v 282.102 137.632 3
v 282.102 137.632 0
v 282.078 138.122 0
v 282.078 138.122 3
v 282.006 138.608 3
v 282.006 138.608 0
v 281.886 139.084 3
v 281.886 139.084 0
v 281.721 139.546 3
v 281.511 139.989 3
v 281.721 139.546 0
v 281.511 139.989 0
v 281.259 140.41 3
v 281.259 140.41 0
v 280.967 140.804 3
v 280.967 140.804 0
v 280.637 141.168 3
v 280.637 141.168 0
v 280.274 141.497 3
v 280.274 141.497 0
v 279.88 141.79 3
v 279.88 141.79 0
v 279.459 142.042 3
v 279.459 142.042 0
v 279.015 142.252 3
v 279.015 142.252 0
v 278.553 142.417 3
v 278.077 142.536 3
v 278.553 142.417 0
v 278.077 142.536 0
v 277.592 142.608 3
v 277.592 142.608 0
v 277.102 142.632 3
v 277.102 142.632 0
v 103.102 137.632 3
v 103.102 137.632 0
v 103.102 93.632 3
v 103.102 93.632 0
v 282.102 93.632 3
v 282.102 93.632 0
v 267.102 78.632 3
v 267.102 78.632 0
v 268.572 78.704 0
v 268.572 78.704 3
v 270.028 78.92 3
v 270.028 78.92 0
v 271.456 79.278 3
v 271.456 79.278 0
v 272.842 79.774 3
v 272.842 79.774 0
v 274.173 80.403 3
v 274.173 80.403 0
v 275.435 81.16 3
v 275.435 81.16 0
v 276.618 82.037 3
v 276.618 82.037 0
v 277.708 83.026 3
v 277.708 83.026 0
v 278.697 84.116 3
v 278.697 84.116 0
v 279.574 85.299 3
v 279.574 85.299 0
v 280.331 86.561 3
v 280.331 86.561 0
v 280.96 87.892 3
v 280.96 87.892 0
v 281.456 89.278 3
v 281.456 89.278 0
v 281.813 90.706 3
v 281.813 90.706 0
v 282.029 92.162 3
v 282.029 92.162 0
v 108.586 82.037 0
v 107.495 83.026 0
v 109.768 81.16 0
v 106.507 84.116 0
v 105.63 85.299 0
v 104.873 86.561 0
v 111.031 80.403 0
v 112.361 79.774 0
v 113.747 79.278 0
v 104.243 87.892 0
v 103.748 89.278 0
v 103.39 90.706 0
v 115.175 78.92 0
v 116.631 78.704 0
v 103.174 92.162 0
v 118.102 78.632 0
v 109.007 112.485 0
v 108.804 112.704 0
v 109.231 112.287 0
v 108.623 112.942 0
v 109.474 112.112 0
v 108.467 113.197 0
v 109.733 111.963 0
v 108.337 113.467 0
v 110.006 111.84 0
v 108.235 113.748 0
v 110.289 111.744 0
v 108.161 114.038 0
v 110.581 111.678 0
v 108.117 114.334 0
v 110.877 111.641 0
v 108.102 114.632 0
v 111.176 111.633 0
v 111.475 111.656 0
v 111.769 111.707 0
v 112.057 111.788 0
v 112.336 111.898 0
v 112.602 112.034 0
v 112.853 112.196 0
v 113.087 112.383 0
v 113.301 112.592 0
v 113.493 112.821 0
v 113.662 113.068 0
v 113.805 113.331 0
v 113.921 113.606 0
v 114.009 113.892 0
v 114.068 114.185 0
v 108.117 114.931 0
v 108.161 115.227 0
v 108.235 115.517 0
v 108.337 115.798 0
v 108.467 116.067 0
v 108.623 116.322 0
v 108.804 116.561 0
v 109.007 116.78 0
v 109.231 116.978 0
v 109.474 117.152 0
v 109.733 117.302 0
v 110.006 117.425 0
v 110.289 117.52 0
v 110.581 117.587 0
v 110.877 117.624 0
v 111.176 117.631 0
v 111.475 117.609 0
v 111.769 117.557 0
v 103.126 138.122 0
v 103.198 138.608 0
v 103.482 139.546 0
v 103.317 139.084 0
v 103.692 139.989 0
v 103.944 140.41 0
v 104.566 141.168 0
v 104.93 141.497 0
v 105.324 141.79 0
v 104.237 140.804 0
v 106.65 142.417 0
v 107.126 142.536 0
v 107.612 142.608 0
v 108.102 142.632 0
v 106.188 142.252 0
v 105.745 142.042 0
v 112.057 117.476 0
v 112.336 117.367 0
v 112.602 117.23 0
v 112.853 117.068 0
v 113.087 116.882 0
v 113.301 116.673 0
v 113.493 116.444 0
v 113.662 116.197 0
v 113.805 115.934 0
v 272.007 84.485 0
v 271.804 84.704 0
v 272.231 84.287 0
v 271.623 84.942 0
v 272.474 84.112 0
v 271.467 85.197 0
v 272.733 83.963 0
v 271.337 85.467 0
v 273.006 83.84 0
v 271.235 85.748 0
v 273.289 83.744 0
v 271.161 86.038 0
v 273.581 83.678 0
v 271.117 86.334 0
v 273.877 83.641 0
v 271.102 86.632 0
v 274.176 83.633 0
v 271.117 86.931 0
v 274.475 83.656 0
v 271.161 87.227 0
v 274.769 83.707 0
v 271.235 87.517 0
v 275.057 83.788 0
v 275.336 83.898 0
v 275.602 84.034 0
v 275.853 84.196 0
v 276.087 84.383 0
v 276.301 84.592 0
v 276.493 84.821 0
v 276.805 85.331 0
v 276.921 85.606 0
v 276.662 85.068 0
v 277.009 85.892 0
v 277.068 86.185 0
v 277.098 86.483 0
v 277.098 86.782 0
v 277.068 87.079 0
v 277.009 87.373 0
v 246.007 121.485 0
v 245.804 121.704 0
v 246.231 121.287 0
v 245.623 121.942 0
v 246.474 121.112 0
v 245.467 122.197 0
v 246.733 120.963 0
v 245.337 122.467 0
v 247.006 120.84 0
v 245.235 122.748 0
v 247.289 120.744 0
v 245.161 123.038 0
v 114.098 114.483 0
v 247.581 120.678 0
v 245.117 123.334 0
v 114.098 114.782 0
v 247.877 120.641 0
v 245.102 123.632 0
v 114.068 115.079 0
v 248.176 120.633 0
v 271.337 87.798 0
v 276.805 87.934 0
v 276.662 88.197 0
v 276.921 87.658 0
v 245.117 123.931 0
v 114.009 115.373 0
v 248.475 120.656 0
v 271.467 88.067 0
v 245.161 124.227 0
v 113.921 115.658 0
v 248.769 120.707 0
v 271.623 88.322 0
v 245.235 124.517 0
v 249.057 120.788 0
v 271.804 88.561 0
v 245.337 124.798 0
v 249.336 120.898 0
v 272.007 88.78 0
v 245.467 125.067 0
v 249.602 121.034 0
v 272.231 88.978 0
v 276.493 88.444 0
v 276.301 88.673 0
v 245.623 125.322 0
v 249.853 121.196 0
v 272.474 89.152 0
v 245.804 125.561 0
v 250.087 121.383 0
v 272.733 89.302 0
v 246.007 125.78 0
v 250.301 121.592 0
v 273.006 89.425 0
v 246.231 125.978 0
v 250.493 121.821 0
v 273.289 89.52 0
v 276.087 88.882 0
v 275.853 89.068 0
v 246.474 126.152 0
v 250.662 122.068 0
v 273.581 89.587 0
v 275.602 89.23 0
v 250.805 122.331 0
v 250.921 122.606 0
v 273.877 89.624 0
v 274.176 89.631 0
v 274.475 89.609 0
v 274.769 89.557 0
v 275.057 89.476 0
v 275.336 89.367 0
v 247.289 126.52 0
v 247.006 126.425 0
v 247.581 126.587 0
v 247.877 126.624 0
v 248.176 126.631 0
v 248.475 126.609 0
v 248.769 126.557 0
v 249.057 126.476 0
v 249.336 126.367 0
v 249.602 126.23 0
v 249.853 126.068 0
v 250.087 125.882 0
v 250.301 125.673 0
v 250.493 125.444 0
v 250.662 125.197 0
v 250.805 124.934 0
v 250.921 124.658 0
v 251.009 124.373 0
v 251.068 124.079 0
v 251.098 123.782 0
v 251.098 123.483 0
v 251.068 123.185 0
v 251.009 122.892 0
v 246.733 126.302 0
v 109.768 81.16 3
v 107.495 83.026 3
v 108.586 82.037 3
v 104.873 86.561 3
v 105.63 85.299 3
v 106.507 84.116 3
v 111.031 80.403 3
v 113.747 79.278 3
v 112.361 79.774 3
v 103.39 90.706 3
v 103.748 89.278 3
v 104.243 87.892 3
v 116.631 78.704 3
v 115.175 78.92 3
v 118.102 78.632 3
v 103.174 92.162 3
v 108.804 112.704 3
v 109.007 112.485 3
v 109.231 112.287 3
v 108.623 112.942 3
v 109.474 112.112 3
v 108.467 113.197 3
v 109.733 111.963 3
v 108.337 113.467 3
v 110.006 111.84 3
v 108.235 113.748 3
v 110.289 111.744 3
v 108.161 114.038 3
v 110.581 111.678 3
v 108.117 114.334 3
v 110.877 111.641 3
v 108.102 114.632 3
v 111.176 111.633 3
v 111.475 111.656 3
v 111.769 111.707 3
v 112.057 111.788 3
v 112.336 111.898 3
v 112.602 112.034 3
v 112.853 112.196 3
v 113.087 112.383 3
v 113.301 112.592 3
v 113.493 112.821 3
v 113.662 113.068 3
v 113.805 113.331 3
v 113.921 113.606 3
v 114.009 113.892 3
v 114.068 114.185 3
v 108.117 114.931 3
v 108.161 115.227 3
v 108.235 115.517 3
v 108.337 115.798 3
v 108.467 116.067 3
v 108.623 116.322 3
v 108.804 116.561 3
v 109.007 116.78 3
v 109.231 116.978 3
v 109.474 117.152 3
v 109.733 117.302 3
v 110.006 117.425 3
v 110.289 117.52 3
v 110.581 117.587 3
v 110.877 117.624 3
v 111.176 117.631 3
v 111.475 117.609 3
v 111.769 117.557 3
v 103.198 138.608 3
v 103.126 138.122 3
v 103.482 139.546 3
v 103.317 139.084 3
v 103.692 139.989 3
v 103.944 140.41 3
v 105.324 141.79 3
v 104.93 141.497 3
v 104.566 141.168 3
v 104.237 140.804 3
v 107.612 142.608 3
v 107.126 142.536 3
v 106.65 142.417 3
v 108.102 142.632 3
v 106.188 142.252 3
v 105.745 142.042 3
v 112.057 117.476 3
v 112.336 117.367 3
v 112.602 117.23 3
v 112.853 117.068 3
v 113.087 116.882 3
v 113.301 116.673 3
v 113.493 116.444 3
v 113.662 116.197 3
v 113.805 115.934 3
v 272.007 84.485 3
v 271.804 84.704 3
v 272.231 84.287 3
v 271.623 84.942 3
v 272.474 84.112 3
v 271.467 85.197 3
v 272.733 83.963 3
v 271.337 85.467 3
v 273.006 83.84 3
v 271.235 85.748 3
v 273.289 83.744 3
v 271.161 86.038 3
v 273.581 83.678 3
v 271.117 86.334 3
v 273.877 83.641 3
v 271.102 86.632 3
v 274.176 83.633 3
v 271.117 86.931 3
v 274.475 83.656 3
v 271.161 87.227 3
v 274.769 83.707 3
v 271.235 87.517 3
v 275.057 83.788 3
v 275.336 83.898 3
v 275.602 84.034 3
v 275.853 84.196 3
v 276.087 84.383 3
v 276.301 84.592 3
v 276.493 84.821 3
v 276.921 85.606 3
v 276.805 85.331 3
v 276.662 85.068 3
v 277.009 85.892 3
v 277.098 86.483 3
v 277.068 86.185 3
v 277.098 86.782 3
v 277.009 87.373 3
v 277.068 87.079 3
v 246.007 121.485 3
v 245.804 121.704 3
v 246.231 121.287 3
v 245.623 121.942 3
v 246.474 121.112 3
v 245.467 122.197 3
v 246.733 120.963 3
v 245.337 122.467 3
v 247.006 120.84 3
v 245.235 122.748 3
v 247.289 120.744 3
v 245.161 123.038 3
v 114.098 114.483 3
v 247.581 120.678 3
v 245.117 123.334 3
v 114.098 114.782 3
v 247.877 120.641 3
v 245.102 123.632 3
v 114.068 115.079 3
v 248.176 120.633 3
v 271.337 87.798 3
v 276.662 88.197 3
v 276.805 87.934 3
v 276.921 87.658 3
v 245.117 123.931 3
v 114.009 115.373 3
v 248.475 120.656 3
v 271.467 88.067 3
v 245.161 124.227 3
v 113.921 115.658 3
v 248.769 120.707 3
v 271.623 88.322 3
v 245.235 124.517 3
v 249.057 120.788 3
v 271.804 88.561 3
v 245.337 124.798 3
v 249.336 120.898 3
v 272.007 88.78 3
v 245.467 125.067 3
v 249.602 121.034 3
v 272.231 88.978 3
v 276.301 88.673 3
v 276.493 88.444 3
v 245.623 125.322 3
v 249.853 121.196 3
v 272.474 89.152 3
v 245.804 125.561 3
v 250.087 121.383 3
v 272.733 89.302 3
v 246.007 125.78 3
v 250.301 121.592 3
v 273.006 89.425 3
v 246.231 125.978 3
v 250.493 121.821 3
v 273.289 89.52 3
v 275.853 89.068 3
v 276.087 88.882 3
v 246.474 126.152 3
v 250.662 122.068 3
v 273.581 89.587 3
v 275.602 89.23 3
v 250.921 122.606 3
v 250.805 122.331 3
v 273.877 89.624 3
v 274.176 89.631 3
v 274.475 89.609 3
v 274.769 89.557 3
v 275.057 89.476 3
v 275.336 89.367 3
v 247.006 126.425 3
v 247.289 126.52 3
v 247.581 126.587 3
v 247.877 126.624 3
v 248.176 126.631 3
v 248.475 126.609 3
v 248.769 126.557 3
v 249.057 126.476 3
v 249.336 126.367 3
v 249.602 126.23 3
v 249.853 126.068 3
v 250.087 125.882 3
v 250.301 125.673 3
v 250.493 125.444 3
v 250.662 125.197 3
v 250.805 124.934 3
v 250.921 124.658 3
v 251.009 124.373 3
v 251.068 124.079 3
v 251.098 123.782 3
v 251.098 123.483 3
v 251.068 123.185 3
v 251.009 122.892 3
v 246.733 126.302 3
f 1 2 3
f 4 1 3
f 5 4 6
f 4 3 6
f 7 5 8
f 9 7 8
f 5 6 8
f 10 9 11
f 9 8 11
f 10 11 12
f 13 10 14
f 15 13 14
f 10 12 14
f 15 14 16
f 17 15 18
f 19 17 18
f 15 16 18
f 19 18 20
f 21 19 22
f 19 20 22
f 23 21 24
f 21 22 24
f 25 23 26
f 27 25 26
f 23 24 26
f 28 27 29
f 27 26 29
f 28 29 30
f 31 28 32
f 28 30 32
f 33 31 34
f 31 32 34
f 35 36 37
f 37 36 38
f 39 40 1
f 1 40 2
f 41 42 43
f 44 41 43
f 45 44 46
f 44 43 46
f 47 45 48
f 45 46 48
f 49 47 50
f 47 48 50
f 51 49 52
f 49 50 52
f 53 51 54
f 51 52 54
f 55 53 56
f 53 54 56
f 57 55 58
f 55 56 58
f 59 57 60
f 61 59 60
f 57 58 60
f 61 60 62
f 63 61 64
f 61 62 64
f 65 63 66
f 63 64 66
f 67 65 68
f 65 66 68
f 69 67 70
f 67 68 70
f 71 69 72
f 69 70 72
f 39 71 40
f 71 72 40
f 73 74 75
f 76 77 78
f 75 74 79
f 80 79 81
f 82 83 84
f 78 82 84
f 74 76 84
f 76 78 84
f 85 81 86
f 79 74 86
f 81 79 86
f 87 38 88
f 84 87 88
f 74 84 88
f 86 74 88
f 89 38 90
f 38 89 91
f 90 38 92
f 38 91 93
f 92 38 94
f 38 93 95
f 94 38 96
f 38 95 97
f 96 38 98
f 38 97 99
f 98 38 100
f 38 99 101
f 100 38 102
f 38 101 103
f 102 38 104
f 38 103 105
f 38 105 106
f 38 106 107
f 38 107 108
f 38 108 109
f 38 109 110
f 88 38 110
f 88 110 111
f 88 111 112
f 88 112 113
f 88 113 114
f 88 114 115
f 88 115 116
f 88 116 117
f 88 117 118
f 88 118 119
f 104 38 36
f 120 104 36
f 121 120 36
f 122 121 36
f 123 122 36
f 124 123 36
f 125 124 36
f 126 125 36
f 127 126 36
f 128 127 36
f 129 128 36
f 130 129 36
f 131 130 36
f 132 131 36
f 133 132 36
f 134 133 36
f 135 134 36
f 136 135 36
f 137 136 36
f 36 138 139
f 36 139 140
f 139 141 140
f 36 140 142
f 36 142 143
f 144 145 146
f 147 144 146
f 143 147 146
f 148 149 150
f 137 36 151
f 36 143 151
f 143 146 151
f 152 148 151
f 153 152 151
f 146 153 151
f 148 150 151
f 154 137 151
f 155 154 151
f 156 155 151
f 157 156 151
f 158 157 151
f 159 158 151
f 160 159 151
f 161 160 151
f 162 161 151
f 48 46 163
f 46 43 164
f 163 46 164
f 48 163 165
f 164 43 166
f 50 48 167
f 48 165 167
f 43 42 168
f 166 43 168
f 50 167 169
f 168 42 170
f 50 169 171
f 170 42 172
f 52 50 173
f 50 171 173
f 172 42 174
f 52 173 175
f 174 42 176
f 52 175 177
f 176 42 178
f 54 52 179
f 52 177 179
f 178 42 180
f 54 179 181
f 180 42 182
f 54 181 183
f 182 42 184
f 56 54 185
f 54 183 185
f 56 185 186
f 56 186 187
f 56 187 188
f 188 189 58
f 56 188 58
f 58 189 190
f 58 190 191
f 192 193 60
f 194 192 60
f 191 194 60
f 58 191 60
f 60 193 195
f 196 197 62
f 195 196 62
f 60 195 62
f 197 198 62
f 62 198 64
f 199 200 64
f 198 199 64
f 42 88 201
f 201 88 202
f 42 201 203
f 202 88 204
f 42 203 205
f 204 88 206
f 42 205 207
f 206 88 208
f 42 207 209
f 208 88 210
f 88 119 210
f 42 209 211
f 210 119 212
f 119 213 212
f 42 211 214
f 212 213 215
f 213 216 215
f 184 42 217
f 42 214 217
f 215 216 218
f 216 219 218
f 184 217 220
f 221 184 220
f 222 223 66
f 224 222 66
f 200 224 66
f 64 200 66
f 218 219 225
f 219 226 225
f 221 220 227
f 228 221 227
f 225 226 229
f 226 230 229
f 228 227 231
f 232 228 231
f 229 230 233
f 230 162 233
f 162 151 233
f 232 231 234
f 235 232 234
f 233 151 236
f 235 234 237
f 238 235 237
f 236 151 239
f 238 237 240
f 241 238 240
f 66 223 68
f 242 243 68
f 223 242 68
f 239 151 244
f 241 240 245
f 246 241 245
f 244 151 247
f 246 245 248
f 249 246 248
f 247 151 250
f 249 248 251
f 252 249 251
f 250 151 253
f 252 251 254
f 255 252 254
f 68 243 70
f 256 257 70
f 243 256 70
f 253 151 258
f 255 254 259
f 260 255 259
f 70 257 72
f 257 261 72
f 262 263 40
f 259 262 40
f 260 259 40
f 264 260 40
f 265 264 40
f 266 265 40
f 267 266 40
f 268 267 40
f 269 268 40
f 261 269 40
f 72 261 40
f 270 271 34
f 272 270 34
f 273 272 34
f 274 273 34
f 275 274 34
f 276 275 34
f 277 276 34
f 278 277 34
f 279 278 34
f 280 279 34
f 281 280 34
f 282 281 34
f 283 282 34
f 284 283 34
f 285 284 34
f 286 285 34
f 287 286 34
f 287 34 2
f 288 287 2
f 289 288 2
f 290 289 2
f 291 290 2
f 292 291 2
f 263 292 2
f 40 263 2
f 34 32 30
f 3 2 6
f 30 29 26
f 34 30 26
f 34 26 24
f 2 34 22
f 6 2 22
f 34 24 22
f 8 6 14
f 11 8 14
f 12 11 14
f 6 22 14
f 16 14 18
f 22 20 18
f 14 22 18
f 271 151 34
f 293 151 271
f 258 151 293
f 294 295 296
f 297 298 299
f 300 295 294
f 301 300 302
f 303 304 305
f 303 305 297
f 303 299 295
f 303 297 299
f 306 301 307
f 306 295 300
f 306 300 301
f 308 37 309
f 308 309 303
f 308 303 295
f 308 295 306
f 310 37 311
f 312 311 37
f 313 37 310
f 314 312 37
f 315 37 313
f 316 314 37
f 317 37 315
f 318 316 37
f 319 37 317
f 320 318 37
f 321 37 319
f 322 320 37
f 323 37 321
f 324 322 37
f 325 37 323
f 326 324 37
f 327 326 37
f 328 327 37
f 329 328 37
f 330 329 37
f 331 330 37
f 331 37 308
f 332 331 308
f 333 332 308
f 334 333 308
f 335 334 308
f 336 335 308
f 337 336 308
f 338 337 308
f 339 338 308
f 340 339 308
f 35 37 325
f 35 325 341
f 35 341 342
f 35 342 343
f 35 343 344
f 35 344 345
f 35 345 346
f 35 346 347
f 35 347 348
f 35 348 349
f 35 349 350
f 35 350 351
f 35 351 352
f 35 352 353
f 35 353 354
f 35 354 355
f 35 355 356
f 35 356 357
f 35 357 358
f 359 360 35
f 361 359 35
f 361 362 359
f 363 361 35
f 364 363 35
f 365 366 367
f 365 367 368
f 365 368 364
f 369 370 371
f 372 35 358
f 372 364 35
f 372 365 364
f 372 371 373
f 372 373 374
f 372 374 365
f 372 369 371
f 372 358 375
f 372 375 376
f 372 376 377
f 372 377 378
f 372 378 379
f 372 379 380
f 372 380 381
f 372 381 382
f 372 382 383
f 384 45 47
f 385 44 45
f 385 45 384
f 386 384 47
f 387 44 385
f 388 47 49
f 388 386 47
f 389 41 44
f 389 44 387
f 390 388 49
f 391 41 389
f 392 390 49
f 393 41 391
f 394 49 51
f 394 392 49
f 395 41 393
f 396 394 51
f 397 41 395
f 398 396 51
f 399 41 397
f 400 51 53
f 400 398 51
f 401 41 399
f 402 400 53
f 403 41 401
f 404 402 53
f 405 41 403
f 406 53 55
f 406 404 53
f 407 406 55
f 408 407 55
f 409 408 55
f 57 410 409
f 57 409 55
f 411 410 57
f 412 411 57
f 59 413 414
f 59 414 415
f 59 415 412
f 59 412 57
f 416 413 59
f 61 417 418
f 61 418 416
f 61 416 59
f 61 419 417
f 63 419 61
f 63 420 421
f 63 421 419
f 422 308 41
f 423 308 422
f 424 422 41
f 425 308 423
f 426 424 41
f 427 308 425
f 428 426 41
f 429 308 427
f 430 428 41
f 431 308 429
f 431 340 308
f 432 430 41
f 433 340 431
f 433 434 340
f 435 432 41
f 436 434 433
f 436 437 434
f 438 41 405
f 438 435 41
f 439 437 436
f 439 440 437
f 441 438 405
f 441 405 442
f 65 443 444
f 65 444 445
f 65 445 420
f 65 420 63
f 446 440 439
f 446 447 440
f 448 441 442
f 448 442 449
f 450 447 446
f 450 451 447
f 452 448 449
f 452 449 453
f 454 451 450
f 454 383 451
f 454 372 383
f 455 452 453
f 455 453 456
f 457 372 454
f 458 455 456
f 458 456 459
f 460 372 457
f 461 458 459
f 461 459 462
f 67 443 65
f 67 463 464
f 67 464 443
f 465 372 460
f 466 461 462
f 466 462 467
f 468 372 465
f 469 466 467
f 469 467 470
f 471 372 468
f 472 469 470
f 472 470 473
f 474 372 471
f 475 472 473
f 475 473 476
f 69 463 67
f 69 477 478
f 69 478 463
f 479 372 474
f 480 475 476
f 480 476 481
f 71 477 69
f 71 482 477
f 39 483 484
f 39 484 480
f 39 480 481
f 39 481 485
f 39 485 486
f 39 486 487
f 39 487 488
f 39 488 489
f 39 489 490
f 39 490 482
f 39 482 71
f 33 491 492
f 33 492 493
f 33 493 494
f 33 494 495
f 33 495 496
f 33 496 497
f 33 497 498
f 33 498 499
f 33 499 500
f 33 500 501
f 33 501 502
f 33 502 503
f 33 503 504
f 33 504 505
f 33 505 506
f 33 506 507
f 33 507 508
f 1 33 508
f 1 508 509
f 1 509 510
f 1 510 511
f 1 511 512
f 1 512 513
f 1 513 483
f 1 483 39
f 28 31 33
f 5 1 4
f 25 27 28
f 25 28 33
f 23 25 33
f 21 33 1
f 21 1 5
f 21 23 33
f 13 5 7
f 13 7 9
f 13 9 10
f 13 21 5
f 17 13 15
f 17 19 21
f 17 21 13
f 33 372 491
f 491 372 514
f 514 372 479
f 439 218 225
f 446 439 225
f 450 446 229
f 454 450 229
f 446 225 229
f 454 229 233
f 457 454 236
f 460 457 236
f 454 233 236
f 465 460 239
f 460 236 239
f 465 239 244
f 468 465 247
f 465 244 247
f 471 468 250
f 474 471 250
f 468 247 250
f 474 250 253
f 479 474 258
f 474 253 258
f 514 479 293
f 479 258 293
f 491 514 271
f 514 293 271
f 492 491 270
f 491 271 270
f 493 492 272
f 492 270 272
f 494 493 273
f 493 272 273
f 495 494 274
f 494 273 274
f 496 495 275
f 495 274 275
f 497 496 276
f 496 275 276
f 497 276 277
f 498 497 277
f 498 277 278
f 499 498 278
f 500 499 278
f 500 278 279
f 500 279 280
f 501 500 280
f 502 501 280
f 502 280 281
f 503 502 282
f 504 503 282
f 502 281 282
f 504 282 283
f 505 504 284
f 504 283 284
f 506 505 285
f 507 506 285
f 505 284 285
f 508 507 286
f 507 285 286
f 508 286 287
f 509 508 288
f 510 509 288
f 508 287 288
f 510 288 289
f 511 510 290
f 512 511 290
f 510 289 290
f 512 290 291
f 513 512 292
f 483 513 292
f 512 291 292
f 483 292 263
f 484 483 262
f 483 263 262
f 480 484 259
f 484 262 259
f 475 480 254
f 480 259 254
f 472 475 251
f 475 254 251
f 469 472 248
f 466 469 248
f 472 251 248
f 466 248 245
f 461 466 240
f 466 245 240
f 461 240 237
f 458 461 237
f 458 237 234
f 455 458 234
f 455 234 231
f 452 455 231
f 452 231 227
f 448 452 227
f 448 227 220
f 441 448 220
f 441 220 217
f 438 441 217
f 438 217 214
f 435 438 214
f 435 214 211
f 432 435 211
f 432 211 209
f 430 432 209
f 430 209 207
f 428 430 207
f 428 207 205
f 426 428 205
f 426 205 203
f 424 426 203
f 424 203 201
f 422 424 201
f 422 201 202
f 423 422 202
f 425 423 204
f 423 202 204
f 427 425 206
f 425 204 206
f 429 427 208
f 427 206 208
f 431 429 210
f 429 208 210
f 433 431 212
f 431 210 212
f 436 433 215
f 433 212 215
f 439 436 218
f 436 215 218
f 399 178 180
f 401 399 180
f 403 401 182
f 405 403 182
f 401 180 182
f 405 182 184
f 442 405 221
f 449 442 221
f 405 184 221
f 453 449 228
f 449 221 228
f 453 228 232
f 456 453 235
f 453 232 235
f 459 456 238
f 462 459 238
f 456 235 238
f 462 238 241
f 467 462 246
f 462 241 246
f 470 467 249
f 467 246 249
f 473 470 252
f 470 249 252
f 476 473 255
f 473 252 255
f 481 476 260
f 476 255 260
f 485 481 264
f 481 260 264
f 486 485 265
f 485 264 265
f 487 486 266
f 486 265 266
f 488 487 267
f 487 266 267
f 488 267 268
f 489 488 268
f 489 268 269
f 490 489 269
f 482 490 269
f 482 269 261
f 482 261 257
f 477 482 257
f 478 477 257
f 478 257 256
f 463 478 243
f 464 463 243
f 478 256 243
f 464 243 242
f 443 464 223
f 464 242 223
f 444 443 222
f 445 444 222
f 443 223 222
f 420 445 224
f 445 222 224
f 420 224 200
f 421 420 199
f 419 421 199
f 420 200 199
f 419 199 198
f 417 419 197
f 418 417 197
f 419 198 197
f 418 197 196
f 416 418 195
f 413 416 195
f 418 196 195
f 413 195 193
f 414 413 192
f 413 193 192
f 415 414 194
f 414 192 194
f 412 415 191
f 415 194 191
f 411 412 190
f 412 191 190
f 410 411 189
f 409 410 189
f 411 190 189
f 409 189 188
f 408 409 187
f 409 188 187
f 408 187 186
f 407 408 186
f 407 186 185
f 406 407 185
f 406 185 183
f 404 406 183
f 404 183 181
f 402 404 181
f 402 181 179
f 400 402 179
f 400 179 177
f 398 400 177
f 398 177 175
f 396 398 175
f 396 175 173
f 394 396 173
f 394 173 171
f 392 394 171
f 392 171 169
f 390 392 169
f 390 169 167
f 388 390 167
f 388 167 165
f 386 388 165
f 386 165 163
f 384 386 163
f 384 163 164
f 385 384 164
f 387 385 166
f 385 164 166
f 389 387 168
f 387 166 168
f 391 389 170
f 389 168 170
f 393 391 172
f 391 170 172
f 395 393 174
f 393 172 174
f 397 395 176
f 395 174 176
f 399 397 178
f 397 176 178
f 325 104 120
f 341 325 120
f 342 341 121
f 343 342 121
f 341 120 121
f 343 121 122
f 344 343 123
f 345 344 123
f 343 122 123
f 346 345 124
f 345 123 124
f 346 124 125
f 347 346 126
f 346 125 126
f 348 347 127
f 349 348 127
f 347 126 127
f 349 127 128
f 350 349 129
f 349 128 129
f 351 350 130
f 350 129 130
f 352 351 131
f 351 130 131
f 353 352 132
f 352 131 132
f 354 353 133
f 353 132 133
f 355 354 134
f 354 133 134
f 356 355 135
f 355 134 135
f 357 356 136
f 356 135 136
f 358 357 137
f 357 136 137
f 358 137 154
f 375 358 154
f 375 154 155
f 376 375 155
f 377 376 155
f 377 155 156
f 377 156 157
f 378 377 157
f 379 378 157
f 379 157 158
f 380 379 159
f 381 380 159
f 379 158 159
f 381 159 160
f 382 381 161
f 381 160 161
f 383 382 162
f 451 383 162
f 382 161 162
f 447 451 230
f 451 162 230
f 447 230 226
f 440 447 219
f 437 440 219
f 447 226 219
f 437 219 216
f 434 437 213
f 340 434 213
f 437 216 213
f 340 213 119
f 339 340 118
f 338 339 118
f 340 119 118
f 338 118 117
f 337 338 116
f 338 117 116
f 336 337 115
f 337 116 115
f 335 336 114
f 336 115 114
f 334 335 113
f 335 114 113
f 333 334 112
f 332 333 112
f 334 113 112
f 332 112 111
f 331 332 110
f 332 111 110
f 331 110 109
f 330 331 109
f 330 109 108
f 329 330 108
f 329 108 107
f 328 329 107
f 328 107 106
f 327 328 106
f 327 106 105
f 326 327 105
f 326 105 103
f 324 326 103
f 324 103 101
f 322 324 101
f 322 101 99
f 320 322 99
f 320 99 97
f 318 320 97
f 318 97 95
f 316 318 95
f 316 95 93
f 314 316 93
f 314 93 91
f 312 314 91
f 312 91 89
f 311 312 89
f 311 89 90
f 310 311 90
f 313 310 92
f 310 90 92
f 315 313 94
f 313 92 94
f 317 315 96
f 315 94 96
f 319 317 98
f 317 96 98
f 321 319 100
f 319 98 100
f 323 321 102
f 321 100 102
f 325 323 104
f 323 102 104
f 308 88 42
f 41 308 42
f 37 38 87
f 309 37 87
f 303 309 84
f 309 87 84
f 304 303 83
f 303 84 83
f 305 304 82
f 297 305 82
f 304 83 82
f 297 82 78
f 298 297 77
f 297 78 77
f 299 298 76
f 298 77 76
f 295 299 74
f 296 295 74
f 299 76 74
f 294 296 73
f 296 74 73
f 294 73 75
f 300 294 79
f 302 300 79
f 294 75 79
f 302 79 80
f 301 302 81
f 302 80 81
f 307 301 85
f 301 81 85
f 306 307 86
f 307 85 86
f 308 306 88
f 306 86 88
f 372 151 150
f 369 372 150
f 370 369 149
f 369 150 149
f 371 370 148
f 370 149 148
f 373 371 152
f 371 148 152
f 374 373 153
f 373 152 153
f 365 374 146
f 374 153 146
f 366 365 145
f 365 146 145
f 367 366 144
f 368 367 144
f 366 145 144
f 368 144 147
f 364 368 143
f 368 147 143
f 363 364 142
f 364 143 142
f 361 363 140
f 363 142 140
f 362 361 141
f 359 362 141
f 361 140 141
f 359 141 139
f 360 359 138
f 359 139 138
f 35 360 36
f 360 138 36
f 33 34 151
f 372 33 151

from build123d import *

# Parameters (mm, degrees)
BOSS_EXTRU_1_DEPTH      = 3
ESQUISSE2_R             = 3
ENL_V_MAT_EXTRU_1_DEPTH = 3


with BuildPart() as part:
    # Esquisse1 → Boss.-Extru.1 (new body)
    with BuildSketch(Plane.XY):
        with BuildLine():
            Line((118.101682981, 78.632253408), (267.101682981, 78.632253408))
            ThreePointArc((267.101682981, 78.632253408), (277.708284699, 83.025651691), (282.101682981, 93.632253408))
            Line((282.101682981, 93.632253408), (282.101682981, 137.632253408))
            ThreePointArc((282.101682981, 137.632253408), (280.637216887, 141.167787314), (277.101682981, 142.632253408))
            Line((277.101682981, 142.632253408), (108.101682981, 142.632253408))
            ThreePointArc((108.101682981, 142.632253408), (104.566149075, 141.167787314), (103.101682981, 137.632253408))
            Line((103.101682981, 137.632253408), (103.101682981, 93.632253408))
            ThreePointArc((103.101682981, 93.632253408), (107.495081263, 83.025651691), (118.101682981, 78.632253408))
        make_face()
    extrude(amount=BOSS_EXTRU_1_DEPTH)

    # Esquisse2 → Enlèv. mat.-Extru.1 (cut)
    with BuildSketch(Plane(origin=(0, 0, 0), x_dir=(-1, 0, 0), z_dir=(0, 0, -1))):
        with Locations((-111.101682981, 114.632253408)):
            Circle(ESQUISSE2_R)
        with Locations((-248.101682981, 123.632253408)):
            Circle(ESQUISSE2_R)
        with Locations((-274.101682981, 86.632253408)):
            Circle(ESQUISSE2_R)
    extrude(amount=-ENL_V_MAT_EXTRU_1_DEPTH, mode=Mode.SUBTRACT)


solid = part.part
